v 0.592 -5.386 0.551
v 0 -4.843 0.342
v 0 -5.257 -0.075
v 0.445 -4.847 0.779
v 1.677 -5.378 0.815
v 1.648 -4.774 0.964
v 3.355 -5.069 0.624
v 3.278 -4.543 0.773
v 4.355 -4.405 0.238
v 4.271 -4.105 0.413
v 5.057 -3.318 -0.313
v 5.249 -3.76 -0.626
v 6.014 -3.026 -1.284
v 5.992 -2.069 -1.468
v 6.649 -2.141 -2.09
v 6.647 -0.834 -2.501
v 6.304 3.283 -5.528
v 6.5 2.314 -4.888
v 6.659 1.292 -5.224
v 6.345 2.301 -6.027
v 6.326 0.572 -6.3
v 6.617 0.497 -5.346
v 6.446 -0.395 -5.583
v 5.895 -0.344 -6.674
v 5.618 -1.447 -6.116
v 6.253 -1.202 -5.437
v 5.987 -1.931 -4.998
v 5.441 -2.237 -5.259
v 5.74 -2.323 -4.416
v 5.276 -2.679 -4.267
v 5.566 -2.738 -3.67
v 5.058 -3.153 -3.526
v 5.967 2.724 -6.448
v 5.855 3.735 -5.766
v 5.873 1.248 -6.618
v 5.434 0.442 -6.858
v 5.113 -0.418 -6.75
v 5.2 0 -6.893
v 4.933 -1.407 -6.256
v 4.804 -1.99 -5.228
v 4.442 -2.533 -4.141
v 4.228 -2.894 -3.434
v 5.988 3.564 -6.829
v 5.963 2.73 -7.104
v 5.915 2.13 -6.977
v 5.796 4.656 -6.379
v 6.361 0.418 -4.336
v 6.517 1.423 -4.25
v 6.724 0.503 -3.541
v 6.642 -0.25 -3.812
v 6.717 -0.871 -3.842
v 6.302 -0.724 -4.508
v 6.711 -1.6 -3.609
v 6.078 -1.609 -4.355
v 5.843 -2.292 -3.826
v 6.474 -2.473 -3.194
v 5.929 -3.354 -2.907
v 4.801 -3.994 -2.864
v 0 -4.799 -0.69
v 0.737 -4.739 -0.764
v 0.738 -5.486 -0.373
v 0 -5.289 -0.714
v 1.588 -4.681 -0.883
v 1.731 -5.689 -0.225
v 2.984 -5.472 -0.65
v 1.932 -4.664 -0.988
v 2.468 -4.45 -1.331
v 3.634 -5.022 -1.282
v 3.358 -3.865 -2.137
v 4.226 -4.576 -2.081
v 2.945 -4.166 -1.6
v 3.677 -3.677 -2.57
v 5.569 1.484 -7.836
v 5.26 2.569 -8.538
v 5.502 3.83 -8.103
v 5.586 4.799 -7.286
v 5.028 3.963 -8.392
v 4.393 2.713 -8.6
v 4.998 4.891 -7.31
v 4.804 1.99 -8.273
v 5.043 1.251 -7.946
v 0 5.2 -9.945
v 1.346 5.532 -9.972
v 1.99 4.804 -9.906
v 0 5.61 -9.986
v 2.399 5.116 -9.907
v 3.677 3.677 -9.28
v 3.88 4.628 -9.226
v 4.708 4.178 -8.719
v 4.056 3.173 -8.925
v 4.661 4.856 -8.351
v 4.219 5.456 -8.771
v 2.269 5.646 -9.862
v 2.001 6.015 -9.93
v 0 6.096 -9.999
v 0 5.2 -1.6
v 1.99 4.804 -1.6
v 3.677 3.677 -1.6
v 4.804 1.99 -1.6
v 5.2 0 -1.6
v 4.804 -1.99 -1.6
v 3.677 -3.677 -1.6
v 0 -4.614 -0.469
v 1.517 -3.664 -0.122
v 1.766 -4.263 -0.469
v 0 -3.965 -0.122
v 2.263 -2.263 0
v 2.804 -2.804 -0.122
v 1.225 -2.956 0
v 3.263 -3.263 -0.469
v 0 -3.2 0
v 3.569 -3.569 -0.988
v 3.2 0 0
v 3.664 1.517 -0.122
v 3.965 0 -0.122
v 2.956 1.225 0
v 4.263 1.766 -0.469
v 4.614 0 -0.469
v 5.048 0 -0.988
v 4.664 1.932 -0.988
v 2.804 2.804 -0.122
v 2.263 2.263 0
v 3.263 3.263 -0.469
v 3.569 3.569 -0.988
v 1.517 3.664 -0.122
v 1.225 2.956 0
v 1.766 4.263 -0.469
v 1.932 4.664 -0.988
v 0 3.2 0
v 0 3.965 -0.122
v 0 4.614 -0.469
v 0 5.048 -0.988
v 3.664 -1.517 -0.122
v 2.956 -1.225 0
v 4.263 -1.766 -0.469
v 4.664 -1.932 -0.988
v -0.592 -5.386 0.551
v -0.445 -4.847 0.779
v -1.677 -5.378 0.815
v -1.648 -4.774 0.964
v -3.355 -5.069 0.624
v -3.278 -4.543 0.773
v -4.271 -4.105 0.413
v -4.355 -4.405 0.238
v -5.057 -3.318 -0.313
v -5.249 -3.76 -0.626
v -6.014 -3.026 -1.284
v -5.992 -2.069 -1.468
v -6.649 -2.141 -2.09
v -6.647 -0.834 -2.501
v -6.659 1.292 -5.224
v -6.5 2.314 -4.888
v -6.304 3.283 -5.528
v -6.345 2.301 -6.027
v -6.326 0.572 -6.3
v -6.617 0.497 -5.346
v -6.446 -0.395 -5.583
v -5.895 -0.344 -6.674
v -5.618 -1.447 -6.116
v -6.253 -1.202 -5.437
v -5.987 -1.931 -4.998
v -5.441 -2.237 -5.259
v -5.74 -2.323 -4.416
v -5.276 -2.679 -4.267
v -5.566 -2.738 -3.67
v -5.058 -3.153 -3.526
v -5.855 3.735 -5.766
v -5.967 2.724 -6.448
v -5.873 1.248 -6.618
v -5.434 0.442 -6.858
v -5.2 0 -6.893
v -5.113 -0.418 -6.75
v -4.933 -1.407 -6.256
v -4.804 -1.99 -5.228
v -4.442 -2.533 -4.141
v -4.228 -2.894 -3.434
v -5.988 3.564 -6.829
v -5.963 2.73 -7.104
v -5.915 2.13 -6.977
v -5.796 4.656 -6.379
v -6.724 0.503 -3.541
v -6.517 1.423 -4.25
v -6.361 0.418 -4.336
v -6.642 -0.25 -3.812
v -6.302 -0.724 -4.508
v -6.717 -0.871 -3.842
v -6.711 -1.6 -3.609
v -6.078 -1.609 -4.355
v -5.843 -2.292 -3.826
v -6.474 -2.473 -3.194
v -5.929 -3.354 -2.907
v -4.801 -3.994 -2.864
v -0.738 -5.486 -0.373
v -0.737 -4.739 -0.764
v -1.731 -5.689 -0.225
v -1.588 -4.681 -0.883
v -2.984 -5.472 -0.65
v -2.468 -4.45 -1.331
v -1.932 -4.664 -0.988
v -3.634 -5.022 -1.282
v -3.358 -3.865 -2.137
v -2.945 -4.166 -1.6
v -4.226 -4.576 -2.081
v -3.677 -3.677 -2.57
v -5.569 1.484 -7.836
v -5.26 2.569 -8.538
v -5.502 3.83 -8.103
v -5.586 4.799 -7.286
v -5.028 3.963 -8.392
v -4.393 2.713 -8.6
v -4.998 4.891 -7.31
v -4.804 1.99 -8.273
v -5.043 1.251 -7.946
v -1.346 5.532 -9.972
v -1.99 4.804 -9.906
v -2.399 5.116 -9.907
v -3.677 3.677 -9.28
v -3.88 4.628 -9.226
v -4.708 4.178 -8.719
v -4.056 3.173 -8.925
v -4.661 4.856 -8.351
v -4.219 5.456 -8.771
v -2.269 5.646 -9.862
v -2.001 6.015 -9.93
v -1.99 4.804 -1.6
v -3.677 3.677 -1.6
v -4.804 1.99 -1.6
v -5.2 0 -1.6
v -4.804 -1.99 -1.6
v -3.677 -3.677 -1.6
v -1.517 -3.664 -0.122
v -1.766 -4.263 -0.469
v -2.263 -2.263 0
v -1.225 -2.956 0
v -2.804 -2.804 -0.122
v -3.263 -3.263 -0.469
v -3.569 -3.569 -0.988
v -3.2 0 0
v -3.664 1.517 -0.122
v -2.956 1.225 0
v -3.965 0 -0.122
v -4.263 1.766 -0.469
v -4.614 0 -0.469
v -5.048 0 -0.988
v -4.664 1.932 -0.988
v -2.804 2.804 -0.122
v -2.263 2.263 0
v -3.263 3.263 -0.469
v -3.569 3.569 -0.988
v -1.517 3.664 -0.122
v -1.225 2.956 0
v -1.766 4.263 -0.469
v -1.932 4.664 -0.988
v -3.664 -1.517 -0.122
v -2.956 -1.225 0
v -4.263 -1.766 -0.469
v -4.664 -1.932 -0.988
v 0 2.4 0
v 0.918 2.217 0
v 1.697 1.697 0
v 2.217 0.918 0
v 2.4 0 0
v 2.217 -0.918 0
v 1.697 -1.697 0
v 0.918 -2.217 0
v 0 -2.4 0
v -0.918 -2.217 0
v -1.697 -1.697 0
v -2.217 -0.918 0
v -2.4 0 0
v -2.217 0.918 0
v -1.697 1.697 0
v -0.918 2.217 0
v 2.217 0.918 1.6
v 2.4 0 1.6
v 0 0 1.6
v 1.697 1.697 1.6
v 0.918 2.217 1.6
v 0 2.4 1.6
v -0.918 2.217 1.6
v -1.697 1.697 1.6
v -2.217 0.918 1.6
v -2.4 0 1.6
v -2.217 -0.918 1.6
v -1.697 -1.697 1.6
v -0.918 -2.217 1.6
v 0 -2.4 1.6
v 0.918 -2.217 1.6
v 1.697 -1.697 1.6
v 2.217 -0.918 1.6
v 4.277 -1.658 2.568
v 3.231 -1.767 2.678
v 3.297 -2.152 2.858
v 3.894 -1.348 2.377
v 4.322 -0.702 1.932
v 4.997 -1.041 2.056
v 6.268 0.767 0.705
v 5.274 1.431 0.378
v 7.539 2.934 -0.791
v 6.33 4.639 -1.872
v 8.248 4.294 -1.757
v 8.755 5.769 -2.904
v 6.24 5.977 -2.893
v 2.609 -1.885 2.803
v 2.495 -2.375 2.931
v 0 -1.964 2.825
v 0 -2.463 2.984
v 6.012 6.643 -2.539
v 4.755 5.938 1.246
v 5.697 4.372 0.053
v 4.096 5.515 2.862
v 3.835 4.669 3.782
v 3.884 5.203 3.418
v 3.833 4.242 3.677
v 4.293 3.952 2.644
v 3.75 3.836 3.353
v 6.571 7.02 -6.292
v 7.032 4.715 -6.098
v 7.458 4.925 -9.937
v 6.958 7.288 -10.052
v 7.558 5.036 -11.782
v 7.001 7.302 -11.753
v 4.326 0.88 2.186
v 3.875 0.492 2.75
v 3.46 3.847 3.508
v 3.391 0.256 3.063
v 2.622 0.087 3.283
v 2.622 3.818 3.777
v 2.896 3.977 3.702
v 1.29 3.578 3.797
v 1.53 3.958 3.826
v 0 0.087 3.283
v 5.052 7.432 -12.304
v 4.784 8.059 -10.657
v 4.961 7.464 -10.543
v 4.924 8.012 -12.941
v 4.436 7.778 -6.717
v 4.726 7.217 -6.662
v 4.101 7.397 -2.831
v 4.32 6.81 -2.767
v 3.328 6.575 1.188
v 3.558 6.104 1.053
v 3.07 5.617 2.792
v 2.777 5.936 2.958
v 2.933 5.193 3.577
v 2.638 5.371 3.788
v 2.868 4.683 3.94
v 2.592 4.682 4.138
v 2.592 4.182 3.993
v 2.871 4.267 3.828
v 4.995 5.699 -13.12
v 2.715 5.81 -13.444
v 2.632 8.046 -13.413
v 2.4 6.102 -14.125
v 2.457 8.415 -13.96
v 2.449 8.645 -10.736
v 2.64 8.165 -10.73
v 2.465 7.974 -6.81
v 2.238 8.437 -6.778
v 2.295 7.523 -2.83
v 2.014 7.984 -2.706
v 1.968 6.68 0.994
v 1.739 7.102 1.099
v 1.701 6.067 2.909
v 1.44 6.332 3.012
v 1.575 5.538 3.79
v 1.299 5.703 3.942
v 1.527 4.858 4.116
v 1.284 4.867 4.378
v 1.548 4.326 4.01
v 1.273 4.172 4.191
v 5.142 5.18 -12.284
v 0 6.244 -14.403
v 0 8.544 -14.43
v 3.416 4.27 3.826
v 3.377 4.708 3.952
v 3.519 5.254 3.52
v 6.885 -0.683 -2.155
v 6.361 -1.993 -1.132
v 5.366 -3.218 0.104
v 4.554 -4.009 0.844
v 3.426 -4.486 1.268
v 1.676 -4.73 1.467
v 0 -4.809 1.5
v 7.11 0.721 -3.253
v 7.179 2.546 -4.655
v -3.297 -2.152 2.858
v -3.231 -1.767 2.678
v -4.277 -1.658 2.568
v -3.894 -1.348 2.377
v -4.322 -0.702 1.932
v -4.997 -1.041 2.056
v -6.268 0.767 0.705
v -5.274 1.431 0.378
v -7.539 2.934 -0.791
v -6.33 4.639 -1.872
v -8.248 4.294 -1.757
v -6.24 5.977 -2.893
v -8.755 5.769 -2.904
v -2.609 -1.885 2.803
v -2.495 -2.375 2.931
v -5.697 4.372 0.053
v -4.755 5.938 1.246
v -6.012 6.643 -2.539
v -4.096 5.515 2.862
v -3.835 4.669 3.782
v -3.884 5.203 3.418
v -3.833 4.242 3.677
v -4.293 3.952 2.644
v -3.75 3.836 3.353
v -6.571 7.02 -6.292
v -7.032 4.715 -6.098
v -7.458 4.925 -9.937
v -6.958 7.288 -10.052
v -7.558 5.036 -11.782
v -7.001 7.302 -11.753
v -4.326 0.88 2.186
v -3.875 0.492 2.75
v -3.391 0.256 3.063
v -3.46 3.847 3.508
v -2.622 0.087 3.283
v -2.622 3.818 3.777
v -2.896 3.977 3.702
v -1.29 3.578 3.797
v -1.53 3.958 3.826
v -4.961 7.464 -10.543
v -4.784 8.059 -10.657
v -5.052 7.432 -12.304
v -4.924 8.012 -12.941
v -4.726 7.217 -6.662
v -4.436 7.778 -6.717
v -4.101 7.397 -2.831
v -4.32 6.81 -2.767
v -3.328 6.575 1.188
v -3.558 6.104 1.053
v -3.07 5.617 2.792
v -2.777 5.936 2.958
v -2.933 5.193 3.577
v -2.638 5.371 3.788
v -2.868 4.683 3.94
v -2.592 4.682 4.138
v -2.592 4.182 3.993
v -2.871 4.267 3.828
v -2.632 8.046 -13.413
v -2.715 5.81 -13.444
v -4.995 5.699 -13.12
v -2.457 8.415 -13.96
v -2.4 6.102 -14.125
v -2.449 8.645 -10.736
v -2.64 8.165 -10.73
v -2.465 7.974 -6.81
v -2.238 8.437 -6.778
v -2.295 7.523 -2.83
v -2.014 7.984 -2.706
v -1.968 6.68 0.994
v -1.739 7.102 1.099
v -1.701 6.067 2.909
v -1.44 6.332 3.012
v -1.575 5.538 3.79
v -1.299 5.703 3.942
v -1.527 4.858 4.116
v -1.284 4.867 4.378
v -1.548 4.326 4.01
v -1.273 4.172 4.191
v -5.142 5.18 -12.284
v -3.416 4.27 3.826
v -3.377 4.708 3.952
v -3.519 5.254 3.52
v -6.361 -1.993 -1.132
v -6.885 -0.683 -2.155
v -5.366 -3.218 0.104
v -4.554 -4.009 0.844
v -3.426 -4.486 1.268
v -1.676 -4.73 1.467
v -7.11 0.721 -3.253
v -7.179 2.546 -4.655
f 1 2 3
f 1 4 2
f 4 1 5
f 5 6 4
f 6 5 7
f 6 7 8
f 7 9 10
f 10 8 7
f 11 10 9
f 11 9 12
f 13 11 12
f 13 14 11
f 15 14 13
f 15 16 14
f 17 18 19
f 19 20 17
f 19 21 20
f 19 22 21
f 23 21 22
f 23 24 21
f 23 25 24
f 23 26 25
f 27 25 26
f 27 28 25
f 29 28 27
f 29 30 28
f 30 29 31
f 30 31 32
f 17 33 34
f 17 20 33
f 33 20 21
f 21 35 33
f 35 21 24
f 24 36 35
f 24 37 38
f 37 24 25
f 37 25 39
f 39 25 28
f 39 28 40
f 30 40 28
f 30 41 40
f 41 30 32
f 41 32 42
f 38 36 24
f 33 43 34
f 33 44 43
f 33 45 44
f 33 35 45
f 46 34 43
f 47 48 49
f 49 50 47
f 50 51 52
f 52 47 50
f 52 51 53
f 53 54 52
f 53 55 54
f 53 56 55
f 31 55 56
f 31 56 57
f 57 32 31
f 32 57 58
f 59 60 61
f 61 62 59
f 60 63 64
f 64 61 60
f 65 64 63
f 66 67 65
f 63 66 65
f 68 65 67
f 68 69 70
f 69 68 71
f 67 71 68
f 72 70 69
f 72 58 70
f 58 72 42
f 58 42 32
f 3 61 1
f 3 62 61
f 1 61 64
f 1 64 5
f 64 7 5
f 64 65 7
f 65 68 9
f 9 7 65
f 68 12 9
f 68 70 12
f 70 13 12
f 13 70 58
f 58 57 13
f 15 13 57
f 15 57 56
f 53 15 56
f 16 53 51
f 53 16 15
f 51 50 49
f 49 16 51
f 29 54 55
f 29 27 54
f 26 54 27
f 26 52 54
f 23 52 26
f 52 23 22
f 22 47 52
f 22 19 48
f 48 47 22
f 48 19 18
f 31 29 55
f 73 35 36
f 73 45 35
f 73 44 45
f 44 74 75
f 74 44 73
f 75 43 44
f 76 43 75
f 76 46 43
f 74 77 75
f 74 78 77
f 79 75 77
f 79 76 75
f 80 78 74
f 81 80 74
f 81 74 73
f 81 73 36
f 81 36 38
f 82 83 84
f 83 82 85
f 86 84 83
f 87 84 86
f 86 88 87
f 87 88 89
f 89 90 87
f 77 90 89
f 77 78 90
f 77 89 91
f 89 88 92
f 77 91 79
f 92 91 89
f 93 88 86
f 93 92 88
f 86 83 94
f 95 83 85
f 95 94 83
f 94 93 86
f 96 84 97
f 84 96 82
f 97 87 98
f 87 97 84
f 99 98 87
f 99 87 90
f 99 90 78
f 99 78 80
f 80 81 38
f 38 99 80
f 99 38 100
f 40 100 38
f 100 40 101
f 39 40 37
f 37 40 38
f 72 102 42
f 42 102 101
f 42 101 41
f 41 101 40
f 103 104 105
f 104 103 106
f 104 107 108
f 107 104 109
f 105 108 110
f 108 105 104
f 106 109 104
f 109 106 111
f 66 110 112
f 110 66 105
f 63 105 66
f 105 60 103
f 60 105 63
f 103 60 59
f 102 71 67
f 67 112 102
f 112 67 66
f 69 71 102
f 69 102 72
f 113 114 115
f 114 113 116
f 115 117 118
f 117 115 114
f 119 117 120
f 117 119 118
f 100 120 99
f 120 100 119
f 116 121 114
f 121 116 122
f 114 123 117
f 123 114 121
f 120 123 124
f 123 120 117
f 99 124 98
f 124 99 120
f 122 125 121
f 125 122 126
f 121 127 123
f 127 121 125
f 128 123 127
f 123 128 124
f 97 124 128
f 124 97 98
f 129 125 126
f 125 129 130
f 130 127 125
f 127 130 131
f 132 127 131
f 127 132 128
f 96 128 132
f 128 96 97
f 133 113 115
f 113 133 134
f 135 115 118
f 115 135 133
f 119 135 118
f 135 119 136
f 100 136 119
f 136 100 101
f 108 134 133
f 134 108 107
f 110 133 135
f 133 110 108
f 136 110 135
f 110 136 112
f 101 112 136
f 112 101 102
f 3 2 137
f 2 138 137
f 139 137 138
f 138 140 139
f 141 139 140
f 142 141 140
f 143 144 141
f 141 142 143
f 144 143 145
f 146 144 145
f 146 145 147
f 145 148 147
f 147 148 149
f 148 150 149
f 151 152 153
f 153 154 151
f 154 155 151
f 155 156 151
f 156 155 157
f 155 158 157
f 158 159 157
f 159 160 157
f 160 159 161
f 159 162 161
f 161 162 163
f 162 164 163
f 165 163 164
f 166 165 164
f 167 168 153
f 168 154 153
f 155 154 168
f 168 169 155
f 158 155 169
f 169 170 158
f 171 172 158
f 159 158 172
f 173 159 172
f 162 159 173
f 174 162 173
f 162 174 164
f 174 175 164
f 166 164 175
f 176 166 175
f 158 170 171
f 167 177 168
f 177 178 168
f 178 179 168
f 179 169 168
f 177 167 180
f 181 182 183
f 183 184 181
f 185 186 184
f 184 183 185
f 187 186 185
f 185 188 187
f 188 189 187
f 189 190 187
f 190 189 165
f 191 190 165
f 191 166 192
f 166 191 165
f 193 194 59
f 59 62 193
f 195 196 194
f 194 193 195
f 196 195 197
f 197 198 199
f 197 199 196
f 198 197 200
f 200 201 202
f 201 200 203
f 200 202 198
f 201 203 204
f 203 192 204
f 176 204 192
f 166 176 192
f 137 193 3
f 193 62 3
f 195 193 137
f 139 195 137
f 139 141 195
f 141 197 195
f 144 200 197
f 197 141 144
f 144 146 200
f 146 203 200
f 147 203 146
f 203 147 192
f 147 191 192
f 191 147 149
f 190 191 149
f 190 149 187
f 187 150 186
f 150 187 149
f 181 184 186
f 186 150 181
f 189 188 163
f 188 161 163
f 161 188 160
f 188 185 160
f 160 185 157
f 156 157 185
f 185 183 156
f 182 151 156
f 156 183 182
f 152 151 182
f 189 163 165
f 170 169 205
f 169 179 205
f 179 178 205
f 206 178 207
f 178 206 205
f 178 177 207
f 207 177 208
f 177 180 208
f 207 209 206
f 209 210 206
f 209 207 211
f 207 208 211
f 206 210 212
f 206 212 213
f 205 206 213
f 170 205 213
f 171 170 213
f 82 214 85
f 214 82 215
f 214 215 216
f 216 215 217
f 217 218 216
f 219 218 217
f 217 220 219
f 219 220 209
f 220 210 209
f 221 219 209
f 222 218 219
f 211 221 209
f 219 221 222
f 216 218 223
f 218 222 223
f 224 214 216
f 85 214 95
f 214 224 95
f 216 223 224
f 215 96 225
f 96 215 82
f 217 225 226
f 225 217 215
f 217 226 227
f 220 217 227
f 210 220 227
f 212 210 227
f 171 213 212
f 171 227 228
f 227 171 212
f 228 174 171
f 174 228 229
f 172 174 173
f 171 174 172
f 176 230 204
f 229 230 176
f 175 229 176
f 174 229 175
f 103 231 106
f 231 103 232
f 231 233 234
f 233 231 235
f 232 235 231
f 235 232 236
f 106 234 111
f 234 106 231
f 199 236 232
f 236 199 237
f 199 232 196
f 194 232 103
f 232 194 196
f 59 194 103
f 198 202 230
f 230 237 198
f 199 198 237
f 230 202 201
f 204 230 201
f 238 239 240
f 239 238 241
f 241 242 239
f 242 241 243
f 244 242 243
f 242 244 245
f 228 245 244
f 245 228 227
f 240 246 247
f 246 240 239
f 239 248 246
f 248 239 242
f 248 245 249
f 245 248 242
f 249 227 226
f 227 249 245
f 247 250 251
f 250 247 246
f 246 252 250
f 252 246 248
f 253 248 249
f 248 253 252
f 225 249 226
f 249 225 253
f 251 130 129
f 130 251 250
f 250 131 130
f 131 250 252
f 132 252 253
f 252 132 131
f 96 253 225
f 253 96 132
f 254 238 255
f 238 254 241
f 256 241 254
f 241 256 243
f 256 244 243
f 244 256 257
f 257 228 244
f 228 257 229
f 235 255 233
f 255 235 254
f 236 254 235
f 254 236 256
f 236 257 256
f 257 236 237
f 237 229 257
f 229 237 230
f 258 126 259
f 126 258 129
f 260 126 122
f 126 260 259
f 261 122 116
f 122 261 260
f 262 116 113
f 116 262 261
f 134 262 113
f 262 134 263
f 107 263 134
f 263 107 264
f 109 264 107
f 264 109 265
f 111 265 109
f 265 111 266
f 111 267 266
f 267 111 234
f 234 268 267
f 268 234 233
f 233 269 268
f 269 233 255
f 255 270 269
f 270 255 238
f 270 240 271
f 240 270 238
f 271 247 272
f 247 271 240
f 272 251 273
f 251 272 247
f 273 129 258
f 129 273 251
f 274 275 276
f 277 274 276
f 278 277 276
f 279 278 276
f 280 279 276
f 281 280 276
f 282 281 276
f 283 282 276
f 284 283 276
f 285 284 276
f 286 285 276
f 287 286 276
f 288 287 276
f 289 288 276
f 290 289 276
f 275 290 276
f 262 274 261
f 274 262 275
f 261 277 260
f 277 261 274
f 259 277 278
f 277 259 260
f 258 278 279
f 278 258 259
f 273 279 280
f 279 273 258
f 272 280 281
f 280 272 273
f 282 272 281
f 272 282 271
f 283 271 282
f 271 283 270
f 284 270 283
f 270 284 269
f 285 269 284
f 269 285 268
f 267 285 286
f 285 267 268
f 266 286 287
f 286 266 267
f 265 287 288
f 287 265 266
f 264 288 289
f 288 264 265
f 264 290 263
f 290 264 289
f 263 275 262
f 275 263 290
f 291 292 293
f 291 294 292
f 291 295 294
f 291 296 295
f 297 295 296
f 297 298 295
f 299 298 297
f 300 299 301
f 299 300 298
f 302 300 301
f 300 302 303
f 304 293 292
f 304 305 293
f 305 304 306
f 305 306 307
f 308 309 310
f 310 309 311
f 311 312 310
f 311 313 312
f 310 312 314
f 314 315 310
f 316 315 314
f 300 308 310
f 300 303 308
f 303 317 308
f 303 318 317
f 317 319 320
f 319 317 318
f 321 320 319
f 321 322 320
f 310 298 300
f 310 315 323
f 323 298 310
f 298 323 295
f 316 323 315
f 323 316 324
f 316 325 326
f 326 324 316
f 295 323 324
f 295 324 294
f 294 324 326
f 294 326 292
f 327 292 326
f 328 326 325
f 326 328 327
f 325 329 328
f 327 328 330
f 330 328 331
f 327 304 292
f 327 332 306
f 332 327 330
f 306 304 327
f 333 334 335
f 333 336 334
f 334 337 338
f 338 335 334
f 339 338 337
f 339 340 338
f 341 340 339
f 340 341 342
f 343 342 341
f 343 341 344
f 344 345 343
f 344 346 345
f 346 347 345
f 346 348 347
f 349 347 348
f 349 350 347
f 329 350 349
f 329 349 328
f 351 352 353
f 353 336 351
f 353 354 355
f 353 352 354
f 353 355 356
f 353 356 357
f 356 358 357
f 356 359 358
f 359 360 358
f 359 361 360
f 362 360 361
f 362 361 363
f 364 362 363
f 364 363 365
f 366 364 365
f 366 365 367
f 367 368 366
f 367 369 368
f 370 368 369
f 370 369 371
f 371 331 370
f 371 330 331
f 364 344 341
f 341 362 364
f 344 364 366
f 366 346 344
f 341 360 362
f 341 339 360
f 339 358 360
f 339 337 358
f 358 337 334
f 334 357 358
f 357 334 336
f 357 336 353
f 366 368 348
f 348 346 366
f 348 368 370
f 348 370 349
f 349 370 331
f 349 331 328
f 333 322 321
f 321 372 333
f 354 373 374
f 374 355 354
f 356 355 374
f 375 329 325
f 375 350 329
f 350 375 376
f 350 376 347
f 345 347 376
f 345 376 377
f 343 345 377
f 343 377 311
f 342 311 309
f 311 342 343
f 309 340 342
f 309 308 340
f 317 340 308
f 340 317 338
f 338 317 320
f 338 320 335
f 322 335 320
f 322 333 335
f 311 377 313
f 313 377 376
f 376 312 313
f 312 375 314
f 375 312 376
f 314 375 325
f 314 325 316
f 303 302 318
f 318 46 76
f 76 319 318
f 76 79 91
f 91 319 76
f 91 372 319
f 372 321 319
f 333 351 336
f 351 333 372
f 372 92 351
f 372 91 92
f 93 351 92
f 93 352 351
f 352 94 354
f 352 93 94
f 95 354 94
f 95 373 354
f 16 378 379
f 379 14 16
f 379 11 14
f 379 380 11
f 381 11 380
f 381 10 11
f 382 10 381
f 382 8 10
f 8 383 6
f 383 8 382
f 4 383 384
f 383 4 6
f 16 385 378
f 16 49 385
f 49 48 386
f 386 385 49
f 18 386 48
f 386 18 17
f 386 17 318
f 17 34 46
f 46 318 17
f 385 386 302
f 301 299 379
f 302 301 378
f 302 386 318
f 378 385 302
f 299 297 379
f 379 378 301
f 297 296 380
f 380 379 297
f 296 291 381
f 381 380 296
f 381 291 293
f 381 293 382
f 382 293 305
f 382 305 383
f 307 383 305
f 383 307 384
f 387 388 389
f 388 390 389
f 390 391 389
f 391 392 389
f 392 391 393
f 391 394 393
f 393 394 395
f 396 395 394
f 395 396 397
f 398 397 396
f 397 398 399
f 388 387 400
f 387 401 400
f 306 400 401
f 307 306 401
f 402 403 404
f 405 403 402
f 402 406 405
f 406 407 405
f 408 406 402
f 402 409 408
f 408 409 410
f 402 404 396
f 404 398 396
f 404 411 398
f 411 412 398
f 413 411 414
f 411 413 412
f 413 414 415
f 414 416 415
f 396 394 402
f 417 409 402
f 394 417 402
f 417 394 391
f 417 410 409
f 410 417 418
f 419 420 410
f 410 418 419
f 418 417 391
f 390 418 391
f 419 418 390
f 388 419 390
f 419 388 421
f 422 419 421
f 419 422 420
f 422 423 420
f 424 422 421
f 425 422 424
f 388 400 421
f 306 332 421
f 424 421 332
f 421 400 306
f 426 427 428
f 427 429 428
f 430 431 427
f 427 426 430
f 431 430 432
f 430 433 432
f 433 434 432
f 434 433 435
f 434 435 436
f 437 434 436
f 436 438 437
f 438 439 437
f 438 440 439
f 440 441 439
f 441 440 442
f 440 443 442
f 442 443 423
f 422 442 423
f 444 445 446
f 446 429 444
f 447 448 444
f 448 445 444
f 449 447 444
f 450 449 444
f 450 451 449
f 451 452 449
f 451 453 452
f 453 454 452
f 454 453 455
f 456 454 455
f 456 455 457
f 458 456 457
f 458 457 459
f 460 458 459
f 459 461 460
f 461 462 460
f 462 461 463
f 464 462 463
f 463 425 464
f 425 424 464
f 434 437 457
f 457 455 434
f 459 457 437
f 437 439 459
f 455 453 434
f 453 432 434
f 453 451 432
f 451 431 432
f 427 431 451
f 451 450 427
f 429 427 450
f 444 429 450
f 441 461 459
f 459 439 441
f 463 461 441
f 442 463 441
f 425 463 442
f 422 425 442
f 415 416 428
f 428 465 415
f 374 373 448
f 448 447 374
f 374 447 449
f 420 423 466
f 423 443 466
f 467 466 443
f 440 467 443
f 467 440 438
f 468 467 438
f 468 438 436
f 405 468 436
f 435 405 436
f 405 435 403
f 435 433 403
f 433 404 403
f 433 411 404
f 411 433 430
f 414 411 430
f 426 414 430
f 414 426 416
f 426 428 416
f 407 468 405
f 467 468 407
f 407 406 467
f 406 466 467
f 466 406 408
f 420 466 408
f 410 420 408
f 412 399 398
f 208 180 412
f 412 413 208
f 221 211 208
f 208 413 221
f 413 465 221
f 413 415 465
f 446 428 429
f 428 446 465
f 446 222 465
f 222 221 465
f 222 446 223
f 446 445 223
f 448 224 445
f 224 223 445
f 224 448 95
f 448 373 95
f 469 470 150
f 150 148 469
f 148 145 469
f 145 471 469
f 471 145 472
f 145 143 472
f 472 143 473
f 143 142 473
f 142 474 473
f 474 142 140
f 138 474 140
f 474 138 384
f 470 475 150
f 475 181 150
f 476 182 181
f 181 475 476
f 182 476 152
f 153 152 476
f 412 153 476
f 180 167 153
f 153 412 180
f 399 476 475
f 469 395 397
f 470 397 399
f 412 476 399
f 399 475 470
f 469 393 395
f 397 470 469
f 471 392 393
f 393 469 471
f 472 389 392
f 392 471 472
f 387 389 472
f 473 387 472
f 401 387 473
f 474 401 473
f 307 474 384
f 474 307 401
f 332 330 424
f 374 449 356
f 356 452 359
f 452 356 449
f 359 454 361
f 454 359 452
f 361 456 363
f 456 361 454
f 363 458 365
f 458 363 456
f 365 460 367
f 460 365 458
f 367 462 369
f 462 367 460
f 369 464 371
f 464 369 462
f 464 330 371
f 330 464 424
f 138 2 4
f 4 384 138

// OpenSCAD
use <../lib.scad>
use <s/80834s01.scad>
use <s/80834s02.scad>
function ldraw_lib__80834() = [
// 0 Minifig Hair with Nurse Hat with Long Back
// 0 Name: 80834.dat
// 0 Author: Philippe Hurbain [Philo]
// 0 !LDRAW_ORG Part UPDATE 2024-04
// 0 !LICENSE Licensed under CC BY 4.0 : see CAreadme.txt
// 
// 0 BFC CERTIFY CCW
  [0,"BFC","CERTIFY"],
  [0,"BFC","CCW"],
// 
// 0 !CATEGORY Minifig Headwear
// 
// 0 !HISTORY 2022-05-05 {LEGO Instructions App} Original part shape
// 0 !HISTORY 2022-05-05 [Philo] File preparation for LDraw Parts Tracker
// 0 !HISTORY 2024-05-28 [OrionP] Official Update 2024-04
// 
// 
// 1 16 0 0 0 1 0 0 0 1 0 0 0 1 s\80834s01.dat
  [1,16,0,0,0,1,0,0,0,1,0,0,0,1, ldraw_lib__s__80834s01()],
// 1 16 0 0 0 1 0 0 0 1 0 0 0 1 s\80834s02.dat
  [1,16,0,0,0,1,0,0,0,1,0,0,0,1, ldraw_lib__s__80834s02()],
];
module ldraw_lib__80834(step=0, col=false, unit=2/5, alt=false, line=0.2, solid=!$preview)
    makepoly(ldraw_lib__80834(), step=step, col=col, unit=unit, alt=alt, line=line, solid=solid);
ldraw_lib__80834(line=0.2);
